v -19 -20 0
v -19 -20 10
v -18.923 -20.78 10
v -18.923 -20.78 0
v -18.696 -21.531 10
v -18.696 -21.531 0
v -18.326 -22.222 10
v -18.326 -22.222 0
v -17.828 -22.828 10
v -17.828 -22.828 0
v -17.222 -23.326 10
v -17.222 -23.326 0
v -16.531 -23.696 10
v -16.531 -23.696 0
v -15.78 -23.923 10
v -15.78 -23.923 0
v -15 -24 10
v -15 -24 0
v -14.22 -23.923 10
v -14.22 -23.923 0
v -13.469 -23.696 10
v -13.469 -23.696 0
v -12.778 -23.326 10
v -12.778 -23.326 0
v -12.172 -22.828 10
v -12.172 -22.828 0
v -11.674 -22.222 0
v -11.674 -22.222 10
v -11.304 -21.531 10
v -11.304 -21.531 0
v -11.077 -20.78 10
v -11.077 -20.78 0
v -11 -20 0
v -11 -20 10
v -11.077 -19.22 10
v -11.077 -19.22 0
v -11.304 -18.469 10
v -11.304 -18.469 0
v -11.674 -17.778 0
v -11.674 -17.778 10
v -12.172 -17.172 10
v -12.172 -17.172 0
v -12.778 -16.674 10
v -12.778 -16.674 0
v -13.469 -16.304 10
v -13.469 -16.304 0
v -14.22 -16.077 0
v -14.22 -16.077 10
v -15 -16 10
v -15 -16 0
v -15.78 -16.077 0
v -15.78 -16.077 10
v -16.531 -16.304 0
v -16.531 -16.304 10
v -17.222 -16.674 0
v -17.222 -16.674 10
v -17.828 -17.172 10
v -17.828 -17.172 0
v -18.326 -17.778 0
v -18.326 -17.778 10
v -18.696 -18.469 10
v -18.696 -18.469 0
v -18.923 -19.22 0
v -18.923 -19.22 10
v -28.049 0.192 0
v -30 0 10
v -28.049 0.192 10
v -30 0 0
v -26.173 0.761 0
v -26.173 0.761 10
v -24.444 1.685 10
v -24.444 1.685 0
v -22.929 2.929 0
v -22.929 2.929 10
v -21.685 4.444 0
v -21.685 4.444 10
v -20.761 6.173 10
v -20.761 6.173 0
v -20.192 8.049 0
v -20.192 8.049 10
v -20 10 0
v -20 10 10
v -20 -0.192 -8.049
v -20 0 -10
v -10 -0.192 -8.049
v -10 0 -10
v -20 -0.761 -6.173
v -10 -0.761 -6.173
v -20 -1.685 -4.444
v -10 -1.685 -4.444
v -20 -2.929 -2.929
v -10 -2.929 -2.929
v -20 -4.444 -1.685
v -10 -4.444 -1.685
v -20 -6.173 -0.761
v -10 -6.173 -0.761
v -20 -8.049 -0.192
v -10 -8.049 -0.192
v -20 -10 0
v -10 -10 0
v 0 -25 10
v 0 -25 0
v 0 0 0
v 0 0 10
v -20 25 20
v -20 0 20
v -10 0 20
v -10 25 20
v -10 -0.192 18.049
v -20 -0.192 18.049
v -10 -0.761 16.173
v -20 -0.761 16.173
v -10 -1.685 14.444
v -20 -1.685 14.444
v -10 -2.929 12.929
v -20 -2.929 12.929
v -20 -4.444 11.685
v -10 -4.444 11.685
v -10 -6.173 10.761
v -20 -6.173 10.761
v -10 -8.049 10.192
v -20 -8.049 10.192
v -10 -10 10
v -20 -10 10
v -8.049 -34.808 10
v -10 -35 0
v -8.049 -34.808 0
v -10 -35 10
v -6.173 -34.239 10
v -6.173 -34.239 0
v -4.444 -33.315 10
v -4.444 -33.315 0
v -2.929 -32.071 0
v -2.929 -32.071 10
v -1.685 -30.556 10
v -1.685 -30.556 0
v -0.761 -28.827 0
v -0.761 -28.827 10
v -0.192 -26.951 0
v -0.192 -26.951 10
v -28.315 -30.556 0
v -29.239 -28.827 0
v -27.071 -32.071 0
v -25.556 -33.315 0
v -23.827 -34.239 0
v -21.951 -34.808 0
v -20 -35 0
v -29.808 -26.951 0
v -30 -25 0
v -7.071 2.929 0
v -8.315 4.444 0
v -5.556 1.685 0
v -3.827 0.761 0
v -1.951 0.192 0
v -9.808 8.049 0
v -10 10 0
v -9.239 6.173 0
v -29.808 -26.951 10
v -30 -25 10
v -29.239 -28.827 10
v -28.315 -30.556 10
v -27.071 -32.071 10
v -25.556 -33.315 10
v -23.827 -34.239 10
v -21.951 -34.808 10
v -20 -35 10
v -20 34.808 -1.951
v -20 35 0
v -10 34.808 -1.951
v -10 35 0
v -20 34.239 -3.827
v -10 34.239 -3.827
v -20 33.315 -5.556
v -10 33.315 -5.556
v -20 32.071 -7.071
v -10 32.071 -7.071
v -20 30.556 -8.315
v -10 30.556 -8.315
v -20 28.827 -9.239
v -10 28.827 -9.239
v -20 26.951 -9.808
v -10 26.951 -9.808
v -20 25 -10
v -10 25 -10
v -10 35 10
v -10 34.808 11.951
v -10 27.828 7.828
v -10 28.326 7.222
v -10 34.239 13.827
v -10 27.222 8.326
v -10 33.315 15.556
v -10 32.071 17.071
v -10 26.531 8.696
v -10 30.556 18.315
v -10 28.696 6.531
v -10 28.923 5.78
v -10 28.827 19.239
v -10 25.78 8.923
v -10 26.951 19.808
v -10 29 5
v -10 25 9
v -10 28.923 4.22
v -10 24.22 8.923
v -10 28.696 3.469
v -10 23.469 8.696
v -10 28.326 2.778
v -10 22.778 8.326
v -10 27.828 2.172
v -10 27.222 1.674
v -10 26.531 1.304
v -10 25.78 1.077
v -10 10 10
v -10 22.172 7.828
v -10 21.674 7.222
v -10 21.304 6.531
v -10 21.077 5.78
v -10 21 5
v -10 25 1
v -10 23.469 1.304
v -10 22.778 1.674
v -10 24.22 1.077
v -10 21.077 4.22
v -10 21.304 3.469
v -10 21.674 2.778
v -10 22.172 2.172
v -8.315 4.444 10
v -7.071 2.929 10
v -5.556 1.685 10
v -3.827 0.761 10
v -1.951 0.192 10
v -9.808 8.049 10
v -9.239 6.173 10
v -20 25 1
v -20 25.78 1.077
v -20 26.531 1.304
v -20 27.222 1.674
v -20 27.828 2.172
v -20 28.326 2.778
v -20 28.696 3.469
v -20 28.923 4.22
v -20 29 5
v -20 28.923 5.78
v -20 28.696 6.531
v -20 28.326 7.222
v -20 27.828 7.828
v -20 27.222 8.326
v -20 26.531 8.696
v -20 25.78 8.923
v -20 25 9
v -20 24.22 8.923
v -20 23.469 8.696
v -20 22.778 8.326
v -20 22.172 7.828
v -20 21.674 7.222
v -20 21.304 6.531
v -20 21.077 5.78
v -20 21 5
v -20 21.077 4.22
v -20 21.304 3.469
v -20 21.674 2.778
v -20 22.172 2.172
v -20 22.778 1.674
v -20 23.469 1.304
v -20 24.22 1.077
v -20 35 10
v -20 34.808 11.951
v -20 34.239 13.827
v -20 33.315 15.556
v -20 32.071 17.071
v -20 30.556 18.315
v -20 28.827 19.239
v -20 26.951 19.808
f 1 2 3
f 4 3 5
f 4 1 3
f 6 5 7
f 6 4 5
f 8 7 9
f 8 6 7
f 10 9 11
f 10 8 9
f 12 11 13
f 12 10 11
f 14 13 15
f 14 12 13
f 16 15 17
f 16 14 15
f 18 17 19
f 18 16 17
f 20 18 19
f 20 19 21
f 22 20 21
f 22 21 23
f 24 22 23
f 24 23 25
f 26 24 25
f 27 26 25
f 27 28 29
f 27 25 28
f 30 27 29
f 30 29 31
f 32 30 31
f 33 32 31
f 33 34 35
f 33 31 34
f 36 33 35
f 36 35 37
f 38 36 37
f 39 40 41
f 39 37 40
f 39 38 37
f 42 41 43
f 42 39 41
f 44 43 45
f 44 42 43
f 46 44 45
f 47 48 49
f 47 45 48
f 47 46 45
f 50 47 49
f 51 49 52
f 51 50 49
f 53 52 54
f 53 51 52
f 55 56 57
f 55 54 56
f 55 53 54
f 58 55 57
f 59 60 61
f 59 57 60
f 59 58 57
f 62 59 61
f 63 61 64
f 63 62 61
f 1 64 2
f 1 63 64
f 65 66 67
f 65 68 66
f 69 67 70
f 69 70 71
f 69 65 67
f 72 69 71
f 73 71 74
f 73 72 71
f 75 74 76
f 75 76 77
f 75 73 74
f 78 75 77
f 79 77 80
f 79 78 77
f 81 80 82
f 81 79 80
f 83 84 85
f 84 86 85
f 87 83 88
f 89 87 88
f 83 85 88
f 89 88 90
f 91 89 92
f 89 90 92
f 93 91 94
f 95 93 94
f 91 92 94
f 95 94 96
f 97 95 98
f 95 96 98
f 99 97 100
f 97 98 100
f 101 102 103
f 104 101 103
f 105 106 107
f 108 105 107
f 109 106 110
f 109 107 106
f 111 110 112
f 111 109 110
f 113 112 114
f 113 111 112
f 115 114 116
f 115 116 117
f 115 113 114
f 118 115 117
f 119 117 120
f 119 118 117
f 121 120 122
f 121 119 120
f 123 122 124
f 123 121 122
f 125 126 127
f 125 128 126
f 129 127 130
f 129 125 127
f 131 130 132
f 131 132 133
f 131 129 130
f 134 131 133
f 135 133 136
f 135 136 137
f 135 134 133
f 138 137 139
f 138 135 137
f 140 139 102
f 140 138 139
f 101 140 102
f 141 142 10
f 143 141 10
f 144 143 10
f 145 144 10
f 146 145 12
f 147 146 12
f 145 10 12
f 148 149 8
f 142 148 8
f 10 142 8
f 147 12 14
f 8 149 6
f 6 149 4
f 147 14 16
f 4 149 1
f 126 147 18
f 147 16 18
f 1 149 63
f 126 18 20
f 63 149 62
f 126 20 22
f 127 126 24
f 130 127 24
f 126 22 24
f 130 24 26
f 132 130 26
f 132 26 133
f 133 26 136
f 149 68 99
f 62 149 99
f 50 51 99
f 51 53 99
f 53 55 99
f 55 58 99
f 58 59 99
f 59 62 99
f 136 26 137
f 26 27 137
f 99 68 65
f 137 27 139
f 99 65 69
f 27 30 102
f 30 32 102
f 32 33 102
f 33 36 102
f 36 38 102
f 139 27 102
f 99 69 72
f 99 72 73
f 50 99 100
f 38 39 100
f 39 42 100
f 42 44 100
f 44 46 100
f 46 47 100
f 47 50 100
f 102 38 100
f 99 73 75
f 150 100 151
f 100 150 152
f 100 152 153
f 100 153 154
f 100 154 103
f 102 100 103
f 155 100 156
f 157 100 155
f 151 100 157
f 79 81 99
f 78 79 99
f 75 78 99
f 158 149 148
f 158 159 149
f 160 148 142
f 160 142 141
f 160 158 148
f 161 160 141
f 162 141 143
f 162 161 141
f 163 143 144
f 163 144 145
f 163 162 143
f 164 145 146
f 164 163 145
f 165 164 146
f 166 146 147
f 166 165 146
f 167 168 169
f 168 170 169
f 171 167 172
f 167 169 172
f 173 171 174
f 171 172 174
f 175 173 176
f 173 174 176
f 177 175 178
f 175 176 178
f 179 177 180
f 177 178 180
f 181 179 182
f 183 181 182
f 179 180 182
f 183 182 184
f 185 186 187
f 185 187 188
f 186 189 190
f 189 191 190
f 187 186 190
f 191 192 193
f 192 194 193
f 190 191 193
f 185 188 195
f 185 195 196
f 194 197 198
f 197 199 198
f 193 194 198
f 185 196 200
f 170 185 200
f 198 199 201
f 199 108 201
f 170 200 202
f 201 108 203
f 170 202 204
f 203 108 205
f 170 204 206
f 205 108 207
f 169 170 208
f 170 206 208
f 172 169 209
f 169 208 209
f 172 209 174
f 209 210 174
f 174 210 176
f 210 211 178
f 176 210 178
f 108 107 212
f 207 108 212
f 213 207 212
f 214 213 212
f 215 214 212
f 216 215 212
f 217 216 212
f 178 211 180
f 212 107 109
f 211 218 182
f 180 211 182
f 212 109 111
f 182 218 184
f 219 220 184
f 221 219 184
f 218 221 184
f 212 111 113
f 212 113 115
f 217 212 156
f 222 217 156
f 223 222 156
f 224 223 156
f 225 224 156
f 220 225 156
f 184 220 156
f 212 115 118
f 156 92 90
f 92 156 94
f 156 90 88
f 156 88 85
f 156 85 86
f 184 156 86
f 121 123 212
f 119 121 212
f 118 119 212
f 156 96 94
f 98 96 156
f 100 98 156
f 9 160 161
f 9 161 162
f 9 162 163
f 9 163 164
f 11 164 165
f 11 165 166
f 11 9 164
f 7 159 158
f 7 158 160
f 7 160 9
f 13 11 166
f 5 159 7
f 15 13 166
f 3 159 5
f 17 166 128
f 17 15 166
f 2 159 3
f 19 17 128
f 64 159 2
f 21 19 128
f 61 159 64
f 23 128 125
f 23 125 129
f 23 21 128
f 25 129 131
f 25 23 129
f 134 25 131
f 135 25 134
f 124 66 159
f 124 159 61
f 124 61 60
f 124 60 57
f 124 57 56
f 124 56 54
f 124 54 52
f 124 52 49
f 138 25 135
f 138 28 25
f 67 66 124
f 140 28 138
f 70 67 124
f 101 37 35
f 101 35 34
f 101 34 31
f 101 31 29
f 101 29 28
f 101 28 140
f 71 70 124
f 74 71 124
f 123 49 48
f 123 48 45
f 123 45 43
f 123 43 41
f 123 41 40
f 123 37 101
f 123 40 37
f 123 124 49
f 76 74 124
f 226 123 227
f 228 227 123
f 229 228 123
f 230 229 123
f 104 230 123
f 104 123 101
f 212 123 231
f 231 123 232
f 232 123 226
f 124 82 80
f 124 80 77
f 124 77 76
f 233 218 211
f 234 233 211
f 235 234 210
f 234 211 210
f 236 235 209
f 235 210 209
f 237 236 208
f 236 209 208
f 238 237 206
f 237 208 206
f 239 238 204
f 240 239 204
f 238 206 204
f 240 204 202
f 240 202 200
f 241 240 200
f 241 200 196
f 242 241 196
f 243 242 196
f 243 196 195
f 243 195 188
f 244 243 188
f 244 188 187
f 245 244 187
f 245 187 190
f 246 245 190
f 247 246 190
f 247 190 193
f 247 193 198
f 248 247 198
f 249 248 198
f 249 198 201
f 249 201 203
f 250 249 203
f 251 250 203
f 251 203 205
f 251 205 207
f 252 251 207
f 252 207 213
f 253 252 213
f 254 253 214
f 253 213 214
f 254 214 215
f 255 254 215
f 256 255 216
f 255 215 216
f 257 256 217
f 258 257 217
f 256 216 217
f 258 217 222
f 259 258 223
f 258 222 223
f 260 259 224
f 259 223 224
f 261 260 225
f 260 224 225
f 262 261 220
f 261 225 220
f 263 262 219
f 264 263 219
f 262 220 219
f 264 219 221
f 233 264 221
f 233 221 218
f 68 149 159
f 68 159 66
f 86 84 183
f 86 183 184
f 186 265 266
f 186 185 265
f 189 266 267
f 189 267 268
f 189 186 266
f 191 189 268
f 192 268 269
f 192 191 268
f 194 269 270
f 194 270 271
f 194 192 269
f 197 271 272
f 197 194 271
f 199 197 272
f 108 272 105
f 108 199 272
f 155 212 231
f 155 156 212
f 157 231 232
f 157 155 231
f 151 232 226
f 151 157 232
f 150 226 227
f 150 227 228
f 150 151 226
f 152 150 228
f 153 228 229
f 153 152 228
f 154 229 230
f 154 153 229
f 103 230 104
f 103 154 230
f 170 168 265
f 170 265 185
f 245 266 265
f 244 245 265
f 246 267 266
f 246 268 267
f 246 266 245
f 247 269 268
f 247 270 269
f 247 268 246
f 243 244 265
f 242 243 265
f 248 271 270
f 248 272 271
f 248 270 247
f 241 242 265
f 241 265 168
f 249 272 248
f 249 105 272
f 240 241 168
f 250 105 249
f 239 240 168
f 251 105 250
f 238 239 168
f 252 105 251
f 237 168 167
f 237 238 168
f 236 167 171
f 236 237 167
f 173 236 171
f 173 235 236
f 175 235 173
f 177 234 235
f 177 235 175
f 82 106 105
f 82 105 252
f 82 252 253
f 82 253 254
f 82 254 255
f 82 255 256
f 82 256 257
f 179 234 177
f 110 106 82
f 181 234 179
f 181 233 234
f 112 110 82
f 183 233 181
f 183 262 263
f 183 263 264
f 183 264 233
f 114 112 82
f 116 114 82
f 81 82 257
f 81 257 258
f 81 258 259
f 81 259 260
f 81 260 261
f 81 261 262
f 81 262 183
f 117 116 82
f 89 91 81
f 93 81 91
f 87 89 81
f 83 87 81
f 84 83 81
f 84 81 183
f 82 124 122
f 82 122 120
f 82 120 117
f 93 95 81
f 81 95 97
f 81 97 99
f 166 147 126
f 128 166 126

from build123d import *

# Parameters (mm, degrees)
SKETCH1_W           = 30
SKETCH1_H           = 35
BOSS_EXTRUDE1_DEPTH = 10
FILLET1_R           = 10
FILLET2_R           = 10
SKETCH11_R          = 4
CUT_EXTRUDE3_DEPTH  = 14
SKETCH12_W          = 10
SKETCH12_H          = 30
BOSS_EXTRUDE4_DEPTH = 35
SKETCH15_R          = 4
CUT_EXTRUDE4_DEPTH  = 35
FILLET10_R          = 10
FILLET11_R          = 10
FILLET13_R          = 10
FILLET14_R          = 10
FILLET15_R          = 10
FILLET16_R          = 10


with BuildPart() as part:
    # Sketch1 → Boss-Extrude1 (new body)
    with BuildSketch(Plane.XY):
        with Locations((-15, -17.5)):
            Rectangle(SKETCH1_W, SKETCH1_H)
    extrude(amount=BOSS_EXTRUDE1_DEPTH)

    # Fillet1
    fillet1_edges = [part.edges().sort_by_distance(p)[0] for p in [
        (-30, -35, 5),
    ]]
    fillet(fillet1_edges, radius=FILLET1_R)

    # Fillet2
    fillet2_edges = [part.edges().sort_by_distance(p)[0] for p in [
        (0, -35, 5),
    ]]
    fillet(fillet2_edges, radius=FILLET2_R)

    # Sketch11 → Cut-Extrude3 (cut)
    with BuildSketch(Plane.XY):
        with Locations(Location((-15, -20, 0), (0, 0, 180))):
            Circle(SKETCH11_R)
    extrude(amount=CUT_EXTRUDE3_DEPTH, mode=Mode.SUBTRACT)

    # Sketch12 → Boss-Extrude4 (add)
    with BuildSketch(Plane(origin=(0, 0, 0), x_dir=(1, 0, 0), z_dir=(0, 1, 0))):
        with Locations((-15, -5)):
            Rectangle(SKETCH12_W, SKETCH12_H)
    extrude(amount=BOSS_EXTRUDE4_DEPTH)

    # Sketch15 → Cut-Extrude4 (cut)
    with BuildSketch(Plane(origin=(-10, 0, 0), x_dir=(0, 0, -1), z_dir=(1, 0, 0))):
        with Locations((-5, 25)):
            Circle(SKETCH15_R)
    extrude(amount=-CUT_EXTRUDE4_DEPTH, mode=Mode.SUBTRACT)

    # Fillet10
    fillet10_edges = [part.edges().sort_by_distance(p)[0] for p in [
        (-15, 35, -10),
    ]]
    fillet(fillet10_edges, radius=FILLET10_R)

    # Fillet11
    fillet11_edges = [part.edges().sort_by_distance(p)[0] for p in [
        (-15, 35, 20),
    ]]
    fillet(fillet11_edges, radius=FILLET11_R)

    # Fillet13
    fillet13_edges = [part.edges().sort_by_distance(p)[0] for p in [
        (-15, 0, 10),
    ]]
    fillet(fillet13_edges, radius=FILLET13_R - 0.0001)  # a hair under: the kernel refuses the full size

    # Fillet14
    fillet14_edges = [part.edges().sort_by_distance(p)[0] for p in [
        (-15, 0, 0),
    ]]
    fillet(fillet14_edges, radius=FILLET14_R - 0.0001)  # a hair under: the kernel refuses the full size

    # Fillet15
    fillet15_edges = [part.edges().sort_by_distance(p)[0] for p in [
        (-10, 0, 5),
    ]]
    fillet(fillet15_edges, radius=FILLET15_R - 0.0001)  # a hair under: the kernel refuses the full size

    # Fillet16
    fillet16_edges = [part.edges().sort_by_distance(p)[0] for p in [
        (-20, 0, 5),
    ]]
    fillet(fillet16_edges, radius=FILLET16_R - 0.0001)  # a hair under: the kernel refuses the full size


solid = part.part
